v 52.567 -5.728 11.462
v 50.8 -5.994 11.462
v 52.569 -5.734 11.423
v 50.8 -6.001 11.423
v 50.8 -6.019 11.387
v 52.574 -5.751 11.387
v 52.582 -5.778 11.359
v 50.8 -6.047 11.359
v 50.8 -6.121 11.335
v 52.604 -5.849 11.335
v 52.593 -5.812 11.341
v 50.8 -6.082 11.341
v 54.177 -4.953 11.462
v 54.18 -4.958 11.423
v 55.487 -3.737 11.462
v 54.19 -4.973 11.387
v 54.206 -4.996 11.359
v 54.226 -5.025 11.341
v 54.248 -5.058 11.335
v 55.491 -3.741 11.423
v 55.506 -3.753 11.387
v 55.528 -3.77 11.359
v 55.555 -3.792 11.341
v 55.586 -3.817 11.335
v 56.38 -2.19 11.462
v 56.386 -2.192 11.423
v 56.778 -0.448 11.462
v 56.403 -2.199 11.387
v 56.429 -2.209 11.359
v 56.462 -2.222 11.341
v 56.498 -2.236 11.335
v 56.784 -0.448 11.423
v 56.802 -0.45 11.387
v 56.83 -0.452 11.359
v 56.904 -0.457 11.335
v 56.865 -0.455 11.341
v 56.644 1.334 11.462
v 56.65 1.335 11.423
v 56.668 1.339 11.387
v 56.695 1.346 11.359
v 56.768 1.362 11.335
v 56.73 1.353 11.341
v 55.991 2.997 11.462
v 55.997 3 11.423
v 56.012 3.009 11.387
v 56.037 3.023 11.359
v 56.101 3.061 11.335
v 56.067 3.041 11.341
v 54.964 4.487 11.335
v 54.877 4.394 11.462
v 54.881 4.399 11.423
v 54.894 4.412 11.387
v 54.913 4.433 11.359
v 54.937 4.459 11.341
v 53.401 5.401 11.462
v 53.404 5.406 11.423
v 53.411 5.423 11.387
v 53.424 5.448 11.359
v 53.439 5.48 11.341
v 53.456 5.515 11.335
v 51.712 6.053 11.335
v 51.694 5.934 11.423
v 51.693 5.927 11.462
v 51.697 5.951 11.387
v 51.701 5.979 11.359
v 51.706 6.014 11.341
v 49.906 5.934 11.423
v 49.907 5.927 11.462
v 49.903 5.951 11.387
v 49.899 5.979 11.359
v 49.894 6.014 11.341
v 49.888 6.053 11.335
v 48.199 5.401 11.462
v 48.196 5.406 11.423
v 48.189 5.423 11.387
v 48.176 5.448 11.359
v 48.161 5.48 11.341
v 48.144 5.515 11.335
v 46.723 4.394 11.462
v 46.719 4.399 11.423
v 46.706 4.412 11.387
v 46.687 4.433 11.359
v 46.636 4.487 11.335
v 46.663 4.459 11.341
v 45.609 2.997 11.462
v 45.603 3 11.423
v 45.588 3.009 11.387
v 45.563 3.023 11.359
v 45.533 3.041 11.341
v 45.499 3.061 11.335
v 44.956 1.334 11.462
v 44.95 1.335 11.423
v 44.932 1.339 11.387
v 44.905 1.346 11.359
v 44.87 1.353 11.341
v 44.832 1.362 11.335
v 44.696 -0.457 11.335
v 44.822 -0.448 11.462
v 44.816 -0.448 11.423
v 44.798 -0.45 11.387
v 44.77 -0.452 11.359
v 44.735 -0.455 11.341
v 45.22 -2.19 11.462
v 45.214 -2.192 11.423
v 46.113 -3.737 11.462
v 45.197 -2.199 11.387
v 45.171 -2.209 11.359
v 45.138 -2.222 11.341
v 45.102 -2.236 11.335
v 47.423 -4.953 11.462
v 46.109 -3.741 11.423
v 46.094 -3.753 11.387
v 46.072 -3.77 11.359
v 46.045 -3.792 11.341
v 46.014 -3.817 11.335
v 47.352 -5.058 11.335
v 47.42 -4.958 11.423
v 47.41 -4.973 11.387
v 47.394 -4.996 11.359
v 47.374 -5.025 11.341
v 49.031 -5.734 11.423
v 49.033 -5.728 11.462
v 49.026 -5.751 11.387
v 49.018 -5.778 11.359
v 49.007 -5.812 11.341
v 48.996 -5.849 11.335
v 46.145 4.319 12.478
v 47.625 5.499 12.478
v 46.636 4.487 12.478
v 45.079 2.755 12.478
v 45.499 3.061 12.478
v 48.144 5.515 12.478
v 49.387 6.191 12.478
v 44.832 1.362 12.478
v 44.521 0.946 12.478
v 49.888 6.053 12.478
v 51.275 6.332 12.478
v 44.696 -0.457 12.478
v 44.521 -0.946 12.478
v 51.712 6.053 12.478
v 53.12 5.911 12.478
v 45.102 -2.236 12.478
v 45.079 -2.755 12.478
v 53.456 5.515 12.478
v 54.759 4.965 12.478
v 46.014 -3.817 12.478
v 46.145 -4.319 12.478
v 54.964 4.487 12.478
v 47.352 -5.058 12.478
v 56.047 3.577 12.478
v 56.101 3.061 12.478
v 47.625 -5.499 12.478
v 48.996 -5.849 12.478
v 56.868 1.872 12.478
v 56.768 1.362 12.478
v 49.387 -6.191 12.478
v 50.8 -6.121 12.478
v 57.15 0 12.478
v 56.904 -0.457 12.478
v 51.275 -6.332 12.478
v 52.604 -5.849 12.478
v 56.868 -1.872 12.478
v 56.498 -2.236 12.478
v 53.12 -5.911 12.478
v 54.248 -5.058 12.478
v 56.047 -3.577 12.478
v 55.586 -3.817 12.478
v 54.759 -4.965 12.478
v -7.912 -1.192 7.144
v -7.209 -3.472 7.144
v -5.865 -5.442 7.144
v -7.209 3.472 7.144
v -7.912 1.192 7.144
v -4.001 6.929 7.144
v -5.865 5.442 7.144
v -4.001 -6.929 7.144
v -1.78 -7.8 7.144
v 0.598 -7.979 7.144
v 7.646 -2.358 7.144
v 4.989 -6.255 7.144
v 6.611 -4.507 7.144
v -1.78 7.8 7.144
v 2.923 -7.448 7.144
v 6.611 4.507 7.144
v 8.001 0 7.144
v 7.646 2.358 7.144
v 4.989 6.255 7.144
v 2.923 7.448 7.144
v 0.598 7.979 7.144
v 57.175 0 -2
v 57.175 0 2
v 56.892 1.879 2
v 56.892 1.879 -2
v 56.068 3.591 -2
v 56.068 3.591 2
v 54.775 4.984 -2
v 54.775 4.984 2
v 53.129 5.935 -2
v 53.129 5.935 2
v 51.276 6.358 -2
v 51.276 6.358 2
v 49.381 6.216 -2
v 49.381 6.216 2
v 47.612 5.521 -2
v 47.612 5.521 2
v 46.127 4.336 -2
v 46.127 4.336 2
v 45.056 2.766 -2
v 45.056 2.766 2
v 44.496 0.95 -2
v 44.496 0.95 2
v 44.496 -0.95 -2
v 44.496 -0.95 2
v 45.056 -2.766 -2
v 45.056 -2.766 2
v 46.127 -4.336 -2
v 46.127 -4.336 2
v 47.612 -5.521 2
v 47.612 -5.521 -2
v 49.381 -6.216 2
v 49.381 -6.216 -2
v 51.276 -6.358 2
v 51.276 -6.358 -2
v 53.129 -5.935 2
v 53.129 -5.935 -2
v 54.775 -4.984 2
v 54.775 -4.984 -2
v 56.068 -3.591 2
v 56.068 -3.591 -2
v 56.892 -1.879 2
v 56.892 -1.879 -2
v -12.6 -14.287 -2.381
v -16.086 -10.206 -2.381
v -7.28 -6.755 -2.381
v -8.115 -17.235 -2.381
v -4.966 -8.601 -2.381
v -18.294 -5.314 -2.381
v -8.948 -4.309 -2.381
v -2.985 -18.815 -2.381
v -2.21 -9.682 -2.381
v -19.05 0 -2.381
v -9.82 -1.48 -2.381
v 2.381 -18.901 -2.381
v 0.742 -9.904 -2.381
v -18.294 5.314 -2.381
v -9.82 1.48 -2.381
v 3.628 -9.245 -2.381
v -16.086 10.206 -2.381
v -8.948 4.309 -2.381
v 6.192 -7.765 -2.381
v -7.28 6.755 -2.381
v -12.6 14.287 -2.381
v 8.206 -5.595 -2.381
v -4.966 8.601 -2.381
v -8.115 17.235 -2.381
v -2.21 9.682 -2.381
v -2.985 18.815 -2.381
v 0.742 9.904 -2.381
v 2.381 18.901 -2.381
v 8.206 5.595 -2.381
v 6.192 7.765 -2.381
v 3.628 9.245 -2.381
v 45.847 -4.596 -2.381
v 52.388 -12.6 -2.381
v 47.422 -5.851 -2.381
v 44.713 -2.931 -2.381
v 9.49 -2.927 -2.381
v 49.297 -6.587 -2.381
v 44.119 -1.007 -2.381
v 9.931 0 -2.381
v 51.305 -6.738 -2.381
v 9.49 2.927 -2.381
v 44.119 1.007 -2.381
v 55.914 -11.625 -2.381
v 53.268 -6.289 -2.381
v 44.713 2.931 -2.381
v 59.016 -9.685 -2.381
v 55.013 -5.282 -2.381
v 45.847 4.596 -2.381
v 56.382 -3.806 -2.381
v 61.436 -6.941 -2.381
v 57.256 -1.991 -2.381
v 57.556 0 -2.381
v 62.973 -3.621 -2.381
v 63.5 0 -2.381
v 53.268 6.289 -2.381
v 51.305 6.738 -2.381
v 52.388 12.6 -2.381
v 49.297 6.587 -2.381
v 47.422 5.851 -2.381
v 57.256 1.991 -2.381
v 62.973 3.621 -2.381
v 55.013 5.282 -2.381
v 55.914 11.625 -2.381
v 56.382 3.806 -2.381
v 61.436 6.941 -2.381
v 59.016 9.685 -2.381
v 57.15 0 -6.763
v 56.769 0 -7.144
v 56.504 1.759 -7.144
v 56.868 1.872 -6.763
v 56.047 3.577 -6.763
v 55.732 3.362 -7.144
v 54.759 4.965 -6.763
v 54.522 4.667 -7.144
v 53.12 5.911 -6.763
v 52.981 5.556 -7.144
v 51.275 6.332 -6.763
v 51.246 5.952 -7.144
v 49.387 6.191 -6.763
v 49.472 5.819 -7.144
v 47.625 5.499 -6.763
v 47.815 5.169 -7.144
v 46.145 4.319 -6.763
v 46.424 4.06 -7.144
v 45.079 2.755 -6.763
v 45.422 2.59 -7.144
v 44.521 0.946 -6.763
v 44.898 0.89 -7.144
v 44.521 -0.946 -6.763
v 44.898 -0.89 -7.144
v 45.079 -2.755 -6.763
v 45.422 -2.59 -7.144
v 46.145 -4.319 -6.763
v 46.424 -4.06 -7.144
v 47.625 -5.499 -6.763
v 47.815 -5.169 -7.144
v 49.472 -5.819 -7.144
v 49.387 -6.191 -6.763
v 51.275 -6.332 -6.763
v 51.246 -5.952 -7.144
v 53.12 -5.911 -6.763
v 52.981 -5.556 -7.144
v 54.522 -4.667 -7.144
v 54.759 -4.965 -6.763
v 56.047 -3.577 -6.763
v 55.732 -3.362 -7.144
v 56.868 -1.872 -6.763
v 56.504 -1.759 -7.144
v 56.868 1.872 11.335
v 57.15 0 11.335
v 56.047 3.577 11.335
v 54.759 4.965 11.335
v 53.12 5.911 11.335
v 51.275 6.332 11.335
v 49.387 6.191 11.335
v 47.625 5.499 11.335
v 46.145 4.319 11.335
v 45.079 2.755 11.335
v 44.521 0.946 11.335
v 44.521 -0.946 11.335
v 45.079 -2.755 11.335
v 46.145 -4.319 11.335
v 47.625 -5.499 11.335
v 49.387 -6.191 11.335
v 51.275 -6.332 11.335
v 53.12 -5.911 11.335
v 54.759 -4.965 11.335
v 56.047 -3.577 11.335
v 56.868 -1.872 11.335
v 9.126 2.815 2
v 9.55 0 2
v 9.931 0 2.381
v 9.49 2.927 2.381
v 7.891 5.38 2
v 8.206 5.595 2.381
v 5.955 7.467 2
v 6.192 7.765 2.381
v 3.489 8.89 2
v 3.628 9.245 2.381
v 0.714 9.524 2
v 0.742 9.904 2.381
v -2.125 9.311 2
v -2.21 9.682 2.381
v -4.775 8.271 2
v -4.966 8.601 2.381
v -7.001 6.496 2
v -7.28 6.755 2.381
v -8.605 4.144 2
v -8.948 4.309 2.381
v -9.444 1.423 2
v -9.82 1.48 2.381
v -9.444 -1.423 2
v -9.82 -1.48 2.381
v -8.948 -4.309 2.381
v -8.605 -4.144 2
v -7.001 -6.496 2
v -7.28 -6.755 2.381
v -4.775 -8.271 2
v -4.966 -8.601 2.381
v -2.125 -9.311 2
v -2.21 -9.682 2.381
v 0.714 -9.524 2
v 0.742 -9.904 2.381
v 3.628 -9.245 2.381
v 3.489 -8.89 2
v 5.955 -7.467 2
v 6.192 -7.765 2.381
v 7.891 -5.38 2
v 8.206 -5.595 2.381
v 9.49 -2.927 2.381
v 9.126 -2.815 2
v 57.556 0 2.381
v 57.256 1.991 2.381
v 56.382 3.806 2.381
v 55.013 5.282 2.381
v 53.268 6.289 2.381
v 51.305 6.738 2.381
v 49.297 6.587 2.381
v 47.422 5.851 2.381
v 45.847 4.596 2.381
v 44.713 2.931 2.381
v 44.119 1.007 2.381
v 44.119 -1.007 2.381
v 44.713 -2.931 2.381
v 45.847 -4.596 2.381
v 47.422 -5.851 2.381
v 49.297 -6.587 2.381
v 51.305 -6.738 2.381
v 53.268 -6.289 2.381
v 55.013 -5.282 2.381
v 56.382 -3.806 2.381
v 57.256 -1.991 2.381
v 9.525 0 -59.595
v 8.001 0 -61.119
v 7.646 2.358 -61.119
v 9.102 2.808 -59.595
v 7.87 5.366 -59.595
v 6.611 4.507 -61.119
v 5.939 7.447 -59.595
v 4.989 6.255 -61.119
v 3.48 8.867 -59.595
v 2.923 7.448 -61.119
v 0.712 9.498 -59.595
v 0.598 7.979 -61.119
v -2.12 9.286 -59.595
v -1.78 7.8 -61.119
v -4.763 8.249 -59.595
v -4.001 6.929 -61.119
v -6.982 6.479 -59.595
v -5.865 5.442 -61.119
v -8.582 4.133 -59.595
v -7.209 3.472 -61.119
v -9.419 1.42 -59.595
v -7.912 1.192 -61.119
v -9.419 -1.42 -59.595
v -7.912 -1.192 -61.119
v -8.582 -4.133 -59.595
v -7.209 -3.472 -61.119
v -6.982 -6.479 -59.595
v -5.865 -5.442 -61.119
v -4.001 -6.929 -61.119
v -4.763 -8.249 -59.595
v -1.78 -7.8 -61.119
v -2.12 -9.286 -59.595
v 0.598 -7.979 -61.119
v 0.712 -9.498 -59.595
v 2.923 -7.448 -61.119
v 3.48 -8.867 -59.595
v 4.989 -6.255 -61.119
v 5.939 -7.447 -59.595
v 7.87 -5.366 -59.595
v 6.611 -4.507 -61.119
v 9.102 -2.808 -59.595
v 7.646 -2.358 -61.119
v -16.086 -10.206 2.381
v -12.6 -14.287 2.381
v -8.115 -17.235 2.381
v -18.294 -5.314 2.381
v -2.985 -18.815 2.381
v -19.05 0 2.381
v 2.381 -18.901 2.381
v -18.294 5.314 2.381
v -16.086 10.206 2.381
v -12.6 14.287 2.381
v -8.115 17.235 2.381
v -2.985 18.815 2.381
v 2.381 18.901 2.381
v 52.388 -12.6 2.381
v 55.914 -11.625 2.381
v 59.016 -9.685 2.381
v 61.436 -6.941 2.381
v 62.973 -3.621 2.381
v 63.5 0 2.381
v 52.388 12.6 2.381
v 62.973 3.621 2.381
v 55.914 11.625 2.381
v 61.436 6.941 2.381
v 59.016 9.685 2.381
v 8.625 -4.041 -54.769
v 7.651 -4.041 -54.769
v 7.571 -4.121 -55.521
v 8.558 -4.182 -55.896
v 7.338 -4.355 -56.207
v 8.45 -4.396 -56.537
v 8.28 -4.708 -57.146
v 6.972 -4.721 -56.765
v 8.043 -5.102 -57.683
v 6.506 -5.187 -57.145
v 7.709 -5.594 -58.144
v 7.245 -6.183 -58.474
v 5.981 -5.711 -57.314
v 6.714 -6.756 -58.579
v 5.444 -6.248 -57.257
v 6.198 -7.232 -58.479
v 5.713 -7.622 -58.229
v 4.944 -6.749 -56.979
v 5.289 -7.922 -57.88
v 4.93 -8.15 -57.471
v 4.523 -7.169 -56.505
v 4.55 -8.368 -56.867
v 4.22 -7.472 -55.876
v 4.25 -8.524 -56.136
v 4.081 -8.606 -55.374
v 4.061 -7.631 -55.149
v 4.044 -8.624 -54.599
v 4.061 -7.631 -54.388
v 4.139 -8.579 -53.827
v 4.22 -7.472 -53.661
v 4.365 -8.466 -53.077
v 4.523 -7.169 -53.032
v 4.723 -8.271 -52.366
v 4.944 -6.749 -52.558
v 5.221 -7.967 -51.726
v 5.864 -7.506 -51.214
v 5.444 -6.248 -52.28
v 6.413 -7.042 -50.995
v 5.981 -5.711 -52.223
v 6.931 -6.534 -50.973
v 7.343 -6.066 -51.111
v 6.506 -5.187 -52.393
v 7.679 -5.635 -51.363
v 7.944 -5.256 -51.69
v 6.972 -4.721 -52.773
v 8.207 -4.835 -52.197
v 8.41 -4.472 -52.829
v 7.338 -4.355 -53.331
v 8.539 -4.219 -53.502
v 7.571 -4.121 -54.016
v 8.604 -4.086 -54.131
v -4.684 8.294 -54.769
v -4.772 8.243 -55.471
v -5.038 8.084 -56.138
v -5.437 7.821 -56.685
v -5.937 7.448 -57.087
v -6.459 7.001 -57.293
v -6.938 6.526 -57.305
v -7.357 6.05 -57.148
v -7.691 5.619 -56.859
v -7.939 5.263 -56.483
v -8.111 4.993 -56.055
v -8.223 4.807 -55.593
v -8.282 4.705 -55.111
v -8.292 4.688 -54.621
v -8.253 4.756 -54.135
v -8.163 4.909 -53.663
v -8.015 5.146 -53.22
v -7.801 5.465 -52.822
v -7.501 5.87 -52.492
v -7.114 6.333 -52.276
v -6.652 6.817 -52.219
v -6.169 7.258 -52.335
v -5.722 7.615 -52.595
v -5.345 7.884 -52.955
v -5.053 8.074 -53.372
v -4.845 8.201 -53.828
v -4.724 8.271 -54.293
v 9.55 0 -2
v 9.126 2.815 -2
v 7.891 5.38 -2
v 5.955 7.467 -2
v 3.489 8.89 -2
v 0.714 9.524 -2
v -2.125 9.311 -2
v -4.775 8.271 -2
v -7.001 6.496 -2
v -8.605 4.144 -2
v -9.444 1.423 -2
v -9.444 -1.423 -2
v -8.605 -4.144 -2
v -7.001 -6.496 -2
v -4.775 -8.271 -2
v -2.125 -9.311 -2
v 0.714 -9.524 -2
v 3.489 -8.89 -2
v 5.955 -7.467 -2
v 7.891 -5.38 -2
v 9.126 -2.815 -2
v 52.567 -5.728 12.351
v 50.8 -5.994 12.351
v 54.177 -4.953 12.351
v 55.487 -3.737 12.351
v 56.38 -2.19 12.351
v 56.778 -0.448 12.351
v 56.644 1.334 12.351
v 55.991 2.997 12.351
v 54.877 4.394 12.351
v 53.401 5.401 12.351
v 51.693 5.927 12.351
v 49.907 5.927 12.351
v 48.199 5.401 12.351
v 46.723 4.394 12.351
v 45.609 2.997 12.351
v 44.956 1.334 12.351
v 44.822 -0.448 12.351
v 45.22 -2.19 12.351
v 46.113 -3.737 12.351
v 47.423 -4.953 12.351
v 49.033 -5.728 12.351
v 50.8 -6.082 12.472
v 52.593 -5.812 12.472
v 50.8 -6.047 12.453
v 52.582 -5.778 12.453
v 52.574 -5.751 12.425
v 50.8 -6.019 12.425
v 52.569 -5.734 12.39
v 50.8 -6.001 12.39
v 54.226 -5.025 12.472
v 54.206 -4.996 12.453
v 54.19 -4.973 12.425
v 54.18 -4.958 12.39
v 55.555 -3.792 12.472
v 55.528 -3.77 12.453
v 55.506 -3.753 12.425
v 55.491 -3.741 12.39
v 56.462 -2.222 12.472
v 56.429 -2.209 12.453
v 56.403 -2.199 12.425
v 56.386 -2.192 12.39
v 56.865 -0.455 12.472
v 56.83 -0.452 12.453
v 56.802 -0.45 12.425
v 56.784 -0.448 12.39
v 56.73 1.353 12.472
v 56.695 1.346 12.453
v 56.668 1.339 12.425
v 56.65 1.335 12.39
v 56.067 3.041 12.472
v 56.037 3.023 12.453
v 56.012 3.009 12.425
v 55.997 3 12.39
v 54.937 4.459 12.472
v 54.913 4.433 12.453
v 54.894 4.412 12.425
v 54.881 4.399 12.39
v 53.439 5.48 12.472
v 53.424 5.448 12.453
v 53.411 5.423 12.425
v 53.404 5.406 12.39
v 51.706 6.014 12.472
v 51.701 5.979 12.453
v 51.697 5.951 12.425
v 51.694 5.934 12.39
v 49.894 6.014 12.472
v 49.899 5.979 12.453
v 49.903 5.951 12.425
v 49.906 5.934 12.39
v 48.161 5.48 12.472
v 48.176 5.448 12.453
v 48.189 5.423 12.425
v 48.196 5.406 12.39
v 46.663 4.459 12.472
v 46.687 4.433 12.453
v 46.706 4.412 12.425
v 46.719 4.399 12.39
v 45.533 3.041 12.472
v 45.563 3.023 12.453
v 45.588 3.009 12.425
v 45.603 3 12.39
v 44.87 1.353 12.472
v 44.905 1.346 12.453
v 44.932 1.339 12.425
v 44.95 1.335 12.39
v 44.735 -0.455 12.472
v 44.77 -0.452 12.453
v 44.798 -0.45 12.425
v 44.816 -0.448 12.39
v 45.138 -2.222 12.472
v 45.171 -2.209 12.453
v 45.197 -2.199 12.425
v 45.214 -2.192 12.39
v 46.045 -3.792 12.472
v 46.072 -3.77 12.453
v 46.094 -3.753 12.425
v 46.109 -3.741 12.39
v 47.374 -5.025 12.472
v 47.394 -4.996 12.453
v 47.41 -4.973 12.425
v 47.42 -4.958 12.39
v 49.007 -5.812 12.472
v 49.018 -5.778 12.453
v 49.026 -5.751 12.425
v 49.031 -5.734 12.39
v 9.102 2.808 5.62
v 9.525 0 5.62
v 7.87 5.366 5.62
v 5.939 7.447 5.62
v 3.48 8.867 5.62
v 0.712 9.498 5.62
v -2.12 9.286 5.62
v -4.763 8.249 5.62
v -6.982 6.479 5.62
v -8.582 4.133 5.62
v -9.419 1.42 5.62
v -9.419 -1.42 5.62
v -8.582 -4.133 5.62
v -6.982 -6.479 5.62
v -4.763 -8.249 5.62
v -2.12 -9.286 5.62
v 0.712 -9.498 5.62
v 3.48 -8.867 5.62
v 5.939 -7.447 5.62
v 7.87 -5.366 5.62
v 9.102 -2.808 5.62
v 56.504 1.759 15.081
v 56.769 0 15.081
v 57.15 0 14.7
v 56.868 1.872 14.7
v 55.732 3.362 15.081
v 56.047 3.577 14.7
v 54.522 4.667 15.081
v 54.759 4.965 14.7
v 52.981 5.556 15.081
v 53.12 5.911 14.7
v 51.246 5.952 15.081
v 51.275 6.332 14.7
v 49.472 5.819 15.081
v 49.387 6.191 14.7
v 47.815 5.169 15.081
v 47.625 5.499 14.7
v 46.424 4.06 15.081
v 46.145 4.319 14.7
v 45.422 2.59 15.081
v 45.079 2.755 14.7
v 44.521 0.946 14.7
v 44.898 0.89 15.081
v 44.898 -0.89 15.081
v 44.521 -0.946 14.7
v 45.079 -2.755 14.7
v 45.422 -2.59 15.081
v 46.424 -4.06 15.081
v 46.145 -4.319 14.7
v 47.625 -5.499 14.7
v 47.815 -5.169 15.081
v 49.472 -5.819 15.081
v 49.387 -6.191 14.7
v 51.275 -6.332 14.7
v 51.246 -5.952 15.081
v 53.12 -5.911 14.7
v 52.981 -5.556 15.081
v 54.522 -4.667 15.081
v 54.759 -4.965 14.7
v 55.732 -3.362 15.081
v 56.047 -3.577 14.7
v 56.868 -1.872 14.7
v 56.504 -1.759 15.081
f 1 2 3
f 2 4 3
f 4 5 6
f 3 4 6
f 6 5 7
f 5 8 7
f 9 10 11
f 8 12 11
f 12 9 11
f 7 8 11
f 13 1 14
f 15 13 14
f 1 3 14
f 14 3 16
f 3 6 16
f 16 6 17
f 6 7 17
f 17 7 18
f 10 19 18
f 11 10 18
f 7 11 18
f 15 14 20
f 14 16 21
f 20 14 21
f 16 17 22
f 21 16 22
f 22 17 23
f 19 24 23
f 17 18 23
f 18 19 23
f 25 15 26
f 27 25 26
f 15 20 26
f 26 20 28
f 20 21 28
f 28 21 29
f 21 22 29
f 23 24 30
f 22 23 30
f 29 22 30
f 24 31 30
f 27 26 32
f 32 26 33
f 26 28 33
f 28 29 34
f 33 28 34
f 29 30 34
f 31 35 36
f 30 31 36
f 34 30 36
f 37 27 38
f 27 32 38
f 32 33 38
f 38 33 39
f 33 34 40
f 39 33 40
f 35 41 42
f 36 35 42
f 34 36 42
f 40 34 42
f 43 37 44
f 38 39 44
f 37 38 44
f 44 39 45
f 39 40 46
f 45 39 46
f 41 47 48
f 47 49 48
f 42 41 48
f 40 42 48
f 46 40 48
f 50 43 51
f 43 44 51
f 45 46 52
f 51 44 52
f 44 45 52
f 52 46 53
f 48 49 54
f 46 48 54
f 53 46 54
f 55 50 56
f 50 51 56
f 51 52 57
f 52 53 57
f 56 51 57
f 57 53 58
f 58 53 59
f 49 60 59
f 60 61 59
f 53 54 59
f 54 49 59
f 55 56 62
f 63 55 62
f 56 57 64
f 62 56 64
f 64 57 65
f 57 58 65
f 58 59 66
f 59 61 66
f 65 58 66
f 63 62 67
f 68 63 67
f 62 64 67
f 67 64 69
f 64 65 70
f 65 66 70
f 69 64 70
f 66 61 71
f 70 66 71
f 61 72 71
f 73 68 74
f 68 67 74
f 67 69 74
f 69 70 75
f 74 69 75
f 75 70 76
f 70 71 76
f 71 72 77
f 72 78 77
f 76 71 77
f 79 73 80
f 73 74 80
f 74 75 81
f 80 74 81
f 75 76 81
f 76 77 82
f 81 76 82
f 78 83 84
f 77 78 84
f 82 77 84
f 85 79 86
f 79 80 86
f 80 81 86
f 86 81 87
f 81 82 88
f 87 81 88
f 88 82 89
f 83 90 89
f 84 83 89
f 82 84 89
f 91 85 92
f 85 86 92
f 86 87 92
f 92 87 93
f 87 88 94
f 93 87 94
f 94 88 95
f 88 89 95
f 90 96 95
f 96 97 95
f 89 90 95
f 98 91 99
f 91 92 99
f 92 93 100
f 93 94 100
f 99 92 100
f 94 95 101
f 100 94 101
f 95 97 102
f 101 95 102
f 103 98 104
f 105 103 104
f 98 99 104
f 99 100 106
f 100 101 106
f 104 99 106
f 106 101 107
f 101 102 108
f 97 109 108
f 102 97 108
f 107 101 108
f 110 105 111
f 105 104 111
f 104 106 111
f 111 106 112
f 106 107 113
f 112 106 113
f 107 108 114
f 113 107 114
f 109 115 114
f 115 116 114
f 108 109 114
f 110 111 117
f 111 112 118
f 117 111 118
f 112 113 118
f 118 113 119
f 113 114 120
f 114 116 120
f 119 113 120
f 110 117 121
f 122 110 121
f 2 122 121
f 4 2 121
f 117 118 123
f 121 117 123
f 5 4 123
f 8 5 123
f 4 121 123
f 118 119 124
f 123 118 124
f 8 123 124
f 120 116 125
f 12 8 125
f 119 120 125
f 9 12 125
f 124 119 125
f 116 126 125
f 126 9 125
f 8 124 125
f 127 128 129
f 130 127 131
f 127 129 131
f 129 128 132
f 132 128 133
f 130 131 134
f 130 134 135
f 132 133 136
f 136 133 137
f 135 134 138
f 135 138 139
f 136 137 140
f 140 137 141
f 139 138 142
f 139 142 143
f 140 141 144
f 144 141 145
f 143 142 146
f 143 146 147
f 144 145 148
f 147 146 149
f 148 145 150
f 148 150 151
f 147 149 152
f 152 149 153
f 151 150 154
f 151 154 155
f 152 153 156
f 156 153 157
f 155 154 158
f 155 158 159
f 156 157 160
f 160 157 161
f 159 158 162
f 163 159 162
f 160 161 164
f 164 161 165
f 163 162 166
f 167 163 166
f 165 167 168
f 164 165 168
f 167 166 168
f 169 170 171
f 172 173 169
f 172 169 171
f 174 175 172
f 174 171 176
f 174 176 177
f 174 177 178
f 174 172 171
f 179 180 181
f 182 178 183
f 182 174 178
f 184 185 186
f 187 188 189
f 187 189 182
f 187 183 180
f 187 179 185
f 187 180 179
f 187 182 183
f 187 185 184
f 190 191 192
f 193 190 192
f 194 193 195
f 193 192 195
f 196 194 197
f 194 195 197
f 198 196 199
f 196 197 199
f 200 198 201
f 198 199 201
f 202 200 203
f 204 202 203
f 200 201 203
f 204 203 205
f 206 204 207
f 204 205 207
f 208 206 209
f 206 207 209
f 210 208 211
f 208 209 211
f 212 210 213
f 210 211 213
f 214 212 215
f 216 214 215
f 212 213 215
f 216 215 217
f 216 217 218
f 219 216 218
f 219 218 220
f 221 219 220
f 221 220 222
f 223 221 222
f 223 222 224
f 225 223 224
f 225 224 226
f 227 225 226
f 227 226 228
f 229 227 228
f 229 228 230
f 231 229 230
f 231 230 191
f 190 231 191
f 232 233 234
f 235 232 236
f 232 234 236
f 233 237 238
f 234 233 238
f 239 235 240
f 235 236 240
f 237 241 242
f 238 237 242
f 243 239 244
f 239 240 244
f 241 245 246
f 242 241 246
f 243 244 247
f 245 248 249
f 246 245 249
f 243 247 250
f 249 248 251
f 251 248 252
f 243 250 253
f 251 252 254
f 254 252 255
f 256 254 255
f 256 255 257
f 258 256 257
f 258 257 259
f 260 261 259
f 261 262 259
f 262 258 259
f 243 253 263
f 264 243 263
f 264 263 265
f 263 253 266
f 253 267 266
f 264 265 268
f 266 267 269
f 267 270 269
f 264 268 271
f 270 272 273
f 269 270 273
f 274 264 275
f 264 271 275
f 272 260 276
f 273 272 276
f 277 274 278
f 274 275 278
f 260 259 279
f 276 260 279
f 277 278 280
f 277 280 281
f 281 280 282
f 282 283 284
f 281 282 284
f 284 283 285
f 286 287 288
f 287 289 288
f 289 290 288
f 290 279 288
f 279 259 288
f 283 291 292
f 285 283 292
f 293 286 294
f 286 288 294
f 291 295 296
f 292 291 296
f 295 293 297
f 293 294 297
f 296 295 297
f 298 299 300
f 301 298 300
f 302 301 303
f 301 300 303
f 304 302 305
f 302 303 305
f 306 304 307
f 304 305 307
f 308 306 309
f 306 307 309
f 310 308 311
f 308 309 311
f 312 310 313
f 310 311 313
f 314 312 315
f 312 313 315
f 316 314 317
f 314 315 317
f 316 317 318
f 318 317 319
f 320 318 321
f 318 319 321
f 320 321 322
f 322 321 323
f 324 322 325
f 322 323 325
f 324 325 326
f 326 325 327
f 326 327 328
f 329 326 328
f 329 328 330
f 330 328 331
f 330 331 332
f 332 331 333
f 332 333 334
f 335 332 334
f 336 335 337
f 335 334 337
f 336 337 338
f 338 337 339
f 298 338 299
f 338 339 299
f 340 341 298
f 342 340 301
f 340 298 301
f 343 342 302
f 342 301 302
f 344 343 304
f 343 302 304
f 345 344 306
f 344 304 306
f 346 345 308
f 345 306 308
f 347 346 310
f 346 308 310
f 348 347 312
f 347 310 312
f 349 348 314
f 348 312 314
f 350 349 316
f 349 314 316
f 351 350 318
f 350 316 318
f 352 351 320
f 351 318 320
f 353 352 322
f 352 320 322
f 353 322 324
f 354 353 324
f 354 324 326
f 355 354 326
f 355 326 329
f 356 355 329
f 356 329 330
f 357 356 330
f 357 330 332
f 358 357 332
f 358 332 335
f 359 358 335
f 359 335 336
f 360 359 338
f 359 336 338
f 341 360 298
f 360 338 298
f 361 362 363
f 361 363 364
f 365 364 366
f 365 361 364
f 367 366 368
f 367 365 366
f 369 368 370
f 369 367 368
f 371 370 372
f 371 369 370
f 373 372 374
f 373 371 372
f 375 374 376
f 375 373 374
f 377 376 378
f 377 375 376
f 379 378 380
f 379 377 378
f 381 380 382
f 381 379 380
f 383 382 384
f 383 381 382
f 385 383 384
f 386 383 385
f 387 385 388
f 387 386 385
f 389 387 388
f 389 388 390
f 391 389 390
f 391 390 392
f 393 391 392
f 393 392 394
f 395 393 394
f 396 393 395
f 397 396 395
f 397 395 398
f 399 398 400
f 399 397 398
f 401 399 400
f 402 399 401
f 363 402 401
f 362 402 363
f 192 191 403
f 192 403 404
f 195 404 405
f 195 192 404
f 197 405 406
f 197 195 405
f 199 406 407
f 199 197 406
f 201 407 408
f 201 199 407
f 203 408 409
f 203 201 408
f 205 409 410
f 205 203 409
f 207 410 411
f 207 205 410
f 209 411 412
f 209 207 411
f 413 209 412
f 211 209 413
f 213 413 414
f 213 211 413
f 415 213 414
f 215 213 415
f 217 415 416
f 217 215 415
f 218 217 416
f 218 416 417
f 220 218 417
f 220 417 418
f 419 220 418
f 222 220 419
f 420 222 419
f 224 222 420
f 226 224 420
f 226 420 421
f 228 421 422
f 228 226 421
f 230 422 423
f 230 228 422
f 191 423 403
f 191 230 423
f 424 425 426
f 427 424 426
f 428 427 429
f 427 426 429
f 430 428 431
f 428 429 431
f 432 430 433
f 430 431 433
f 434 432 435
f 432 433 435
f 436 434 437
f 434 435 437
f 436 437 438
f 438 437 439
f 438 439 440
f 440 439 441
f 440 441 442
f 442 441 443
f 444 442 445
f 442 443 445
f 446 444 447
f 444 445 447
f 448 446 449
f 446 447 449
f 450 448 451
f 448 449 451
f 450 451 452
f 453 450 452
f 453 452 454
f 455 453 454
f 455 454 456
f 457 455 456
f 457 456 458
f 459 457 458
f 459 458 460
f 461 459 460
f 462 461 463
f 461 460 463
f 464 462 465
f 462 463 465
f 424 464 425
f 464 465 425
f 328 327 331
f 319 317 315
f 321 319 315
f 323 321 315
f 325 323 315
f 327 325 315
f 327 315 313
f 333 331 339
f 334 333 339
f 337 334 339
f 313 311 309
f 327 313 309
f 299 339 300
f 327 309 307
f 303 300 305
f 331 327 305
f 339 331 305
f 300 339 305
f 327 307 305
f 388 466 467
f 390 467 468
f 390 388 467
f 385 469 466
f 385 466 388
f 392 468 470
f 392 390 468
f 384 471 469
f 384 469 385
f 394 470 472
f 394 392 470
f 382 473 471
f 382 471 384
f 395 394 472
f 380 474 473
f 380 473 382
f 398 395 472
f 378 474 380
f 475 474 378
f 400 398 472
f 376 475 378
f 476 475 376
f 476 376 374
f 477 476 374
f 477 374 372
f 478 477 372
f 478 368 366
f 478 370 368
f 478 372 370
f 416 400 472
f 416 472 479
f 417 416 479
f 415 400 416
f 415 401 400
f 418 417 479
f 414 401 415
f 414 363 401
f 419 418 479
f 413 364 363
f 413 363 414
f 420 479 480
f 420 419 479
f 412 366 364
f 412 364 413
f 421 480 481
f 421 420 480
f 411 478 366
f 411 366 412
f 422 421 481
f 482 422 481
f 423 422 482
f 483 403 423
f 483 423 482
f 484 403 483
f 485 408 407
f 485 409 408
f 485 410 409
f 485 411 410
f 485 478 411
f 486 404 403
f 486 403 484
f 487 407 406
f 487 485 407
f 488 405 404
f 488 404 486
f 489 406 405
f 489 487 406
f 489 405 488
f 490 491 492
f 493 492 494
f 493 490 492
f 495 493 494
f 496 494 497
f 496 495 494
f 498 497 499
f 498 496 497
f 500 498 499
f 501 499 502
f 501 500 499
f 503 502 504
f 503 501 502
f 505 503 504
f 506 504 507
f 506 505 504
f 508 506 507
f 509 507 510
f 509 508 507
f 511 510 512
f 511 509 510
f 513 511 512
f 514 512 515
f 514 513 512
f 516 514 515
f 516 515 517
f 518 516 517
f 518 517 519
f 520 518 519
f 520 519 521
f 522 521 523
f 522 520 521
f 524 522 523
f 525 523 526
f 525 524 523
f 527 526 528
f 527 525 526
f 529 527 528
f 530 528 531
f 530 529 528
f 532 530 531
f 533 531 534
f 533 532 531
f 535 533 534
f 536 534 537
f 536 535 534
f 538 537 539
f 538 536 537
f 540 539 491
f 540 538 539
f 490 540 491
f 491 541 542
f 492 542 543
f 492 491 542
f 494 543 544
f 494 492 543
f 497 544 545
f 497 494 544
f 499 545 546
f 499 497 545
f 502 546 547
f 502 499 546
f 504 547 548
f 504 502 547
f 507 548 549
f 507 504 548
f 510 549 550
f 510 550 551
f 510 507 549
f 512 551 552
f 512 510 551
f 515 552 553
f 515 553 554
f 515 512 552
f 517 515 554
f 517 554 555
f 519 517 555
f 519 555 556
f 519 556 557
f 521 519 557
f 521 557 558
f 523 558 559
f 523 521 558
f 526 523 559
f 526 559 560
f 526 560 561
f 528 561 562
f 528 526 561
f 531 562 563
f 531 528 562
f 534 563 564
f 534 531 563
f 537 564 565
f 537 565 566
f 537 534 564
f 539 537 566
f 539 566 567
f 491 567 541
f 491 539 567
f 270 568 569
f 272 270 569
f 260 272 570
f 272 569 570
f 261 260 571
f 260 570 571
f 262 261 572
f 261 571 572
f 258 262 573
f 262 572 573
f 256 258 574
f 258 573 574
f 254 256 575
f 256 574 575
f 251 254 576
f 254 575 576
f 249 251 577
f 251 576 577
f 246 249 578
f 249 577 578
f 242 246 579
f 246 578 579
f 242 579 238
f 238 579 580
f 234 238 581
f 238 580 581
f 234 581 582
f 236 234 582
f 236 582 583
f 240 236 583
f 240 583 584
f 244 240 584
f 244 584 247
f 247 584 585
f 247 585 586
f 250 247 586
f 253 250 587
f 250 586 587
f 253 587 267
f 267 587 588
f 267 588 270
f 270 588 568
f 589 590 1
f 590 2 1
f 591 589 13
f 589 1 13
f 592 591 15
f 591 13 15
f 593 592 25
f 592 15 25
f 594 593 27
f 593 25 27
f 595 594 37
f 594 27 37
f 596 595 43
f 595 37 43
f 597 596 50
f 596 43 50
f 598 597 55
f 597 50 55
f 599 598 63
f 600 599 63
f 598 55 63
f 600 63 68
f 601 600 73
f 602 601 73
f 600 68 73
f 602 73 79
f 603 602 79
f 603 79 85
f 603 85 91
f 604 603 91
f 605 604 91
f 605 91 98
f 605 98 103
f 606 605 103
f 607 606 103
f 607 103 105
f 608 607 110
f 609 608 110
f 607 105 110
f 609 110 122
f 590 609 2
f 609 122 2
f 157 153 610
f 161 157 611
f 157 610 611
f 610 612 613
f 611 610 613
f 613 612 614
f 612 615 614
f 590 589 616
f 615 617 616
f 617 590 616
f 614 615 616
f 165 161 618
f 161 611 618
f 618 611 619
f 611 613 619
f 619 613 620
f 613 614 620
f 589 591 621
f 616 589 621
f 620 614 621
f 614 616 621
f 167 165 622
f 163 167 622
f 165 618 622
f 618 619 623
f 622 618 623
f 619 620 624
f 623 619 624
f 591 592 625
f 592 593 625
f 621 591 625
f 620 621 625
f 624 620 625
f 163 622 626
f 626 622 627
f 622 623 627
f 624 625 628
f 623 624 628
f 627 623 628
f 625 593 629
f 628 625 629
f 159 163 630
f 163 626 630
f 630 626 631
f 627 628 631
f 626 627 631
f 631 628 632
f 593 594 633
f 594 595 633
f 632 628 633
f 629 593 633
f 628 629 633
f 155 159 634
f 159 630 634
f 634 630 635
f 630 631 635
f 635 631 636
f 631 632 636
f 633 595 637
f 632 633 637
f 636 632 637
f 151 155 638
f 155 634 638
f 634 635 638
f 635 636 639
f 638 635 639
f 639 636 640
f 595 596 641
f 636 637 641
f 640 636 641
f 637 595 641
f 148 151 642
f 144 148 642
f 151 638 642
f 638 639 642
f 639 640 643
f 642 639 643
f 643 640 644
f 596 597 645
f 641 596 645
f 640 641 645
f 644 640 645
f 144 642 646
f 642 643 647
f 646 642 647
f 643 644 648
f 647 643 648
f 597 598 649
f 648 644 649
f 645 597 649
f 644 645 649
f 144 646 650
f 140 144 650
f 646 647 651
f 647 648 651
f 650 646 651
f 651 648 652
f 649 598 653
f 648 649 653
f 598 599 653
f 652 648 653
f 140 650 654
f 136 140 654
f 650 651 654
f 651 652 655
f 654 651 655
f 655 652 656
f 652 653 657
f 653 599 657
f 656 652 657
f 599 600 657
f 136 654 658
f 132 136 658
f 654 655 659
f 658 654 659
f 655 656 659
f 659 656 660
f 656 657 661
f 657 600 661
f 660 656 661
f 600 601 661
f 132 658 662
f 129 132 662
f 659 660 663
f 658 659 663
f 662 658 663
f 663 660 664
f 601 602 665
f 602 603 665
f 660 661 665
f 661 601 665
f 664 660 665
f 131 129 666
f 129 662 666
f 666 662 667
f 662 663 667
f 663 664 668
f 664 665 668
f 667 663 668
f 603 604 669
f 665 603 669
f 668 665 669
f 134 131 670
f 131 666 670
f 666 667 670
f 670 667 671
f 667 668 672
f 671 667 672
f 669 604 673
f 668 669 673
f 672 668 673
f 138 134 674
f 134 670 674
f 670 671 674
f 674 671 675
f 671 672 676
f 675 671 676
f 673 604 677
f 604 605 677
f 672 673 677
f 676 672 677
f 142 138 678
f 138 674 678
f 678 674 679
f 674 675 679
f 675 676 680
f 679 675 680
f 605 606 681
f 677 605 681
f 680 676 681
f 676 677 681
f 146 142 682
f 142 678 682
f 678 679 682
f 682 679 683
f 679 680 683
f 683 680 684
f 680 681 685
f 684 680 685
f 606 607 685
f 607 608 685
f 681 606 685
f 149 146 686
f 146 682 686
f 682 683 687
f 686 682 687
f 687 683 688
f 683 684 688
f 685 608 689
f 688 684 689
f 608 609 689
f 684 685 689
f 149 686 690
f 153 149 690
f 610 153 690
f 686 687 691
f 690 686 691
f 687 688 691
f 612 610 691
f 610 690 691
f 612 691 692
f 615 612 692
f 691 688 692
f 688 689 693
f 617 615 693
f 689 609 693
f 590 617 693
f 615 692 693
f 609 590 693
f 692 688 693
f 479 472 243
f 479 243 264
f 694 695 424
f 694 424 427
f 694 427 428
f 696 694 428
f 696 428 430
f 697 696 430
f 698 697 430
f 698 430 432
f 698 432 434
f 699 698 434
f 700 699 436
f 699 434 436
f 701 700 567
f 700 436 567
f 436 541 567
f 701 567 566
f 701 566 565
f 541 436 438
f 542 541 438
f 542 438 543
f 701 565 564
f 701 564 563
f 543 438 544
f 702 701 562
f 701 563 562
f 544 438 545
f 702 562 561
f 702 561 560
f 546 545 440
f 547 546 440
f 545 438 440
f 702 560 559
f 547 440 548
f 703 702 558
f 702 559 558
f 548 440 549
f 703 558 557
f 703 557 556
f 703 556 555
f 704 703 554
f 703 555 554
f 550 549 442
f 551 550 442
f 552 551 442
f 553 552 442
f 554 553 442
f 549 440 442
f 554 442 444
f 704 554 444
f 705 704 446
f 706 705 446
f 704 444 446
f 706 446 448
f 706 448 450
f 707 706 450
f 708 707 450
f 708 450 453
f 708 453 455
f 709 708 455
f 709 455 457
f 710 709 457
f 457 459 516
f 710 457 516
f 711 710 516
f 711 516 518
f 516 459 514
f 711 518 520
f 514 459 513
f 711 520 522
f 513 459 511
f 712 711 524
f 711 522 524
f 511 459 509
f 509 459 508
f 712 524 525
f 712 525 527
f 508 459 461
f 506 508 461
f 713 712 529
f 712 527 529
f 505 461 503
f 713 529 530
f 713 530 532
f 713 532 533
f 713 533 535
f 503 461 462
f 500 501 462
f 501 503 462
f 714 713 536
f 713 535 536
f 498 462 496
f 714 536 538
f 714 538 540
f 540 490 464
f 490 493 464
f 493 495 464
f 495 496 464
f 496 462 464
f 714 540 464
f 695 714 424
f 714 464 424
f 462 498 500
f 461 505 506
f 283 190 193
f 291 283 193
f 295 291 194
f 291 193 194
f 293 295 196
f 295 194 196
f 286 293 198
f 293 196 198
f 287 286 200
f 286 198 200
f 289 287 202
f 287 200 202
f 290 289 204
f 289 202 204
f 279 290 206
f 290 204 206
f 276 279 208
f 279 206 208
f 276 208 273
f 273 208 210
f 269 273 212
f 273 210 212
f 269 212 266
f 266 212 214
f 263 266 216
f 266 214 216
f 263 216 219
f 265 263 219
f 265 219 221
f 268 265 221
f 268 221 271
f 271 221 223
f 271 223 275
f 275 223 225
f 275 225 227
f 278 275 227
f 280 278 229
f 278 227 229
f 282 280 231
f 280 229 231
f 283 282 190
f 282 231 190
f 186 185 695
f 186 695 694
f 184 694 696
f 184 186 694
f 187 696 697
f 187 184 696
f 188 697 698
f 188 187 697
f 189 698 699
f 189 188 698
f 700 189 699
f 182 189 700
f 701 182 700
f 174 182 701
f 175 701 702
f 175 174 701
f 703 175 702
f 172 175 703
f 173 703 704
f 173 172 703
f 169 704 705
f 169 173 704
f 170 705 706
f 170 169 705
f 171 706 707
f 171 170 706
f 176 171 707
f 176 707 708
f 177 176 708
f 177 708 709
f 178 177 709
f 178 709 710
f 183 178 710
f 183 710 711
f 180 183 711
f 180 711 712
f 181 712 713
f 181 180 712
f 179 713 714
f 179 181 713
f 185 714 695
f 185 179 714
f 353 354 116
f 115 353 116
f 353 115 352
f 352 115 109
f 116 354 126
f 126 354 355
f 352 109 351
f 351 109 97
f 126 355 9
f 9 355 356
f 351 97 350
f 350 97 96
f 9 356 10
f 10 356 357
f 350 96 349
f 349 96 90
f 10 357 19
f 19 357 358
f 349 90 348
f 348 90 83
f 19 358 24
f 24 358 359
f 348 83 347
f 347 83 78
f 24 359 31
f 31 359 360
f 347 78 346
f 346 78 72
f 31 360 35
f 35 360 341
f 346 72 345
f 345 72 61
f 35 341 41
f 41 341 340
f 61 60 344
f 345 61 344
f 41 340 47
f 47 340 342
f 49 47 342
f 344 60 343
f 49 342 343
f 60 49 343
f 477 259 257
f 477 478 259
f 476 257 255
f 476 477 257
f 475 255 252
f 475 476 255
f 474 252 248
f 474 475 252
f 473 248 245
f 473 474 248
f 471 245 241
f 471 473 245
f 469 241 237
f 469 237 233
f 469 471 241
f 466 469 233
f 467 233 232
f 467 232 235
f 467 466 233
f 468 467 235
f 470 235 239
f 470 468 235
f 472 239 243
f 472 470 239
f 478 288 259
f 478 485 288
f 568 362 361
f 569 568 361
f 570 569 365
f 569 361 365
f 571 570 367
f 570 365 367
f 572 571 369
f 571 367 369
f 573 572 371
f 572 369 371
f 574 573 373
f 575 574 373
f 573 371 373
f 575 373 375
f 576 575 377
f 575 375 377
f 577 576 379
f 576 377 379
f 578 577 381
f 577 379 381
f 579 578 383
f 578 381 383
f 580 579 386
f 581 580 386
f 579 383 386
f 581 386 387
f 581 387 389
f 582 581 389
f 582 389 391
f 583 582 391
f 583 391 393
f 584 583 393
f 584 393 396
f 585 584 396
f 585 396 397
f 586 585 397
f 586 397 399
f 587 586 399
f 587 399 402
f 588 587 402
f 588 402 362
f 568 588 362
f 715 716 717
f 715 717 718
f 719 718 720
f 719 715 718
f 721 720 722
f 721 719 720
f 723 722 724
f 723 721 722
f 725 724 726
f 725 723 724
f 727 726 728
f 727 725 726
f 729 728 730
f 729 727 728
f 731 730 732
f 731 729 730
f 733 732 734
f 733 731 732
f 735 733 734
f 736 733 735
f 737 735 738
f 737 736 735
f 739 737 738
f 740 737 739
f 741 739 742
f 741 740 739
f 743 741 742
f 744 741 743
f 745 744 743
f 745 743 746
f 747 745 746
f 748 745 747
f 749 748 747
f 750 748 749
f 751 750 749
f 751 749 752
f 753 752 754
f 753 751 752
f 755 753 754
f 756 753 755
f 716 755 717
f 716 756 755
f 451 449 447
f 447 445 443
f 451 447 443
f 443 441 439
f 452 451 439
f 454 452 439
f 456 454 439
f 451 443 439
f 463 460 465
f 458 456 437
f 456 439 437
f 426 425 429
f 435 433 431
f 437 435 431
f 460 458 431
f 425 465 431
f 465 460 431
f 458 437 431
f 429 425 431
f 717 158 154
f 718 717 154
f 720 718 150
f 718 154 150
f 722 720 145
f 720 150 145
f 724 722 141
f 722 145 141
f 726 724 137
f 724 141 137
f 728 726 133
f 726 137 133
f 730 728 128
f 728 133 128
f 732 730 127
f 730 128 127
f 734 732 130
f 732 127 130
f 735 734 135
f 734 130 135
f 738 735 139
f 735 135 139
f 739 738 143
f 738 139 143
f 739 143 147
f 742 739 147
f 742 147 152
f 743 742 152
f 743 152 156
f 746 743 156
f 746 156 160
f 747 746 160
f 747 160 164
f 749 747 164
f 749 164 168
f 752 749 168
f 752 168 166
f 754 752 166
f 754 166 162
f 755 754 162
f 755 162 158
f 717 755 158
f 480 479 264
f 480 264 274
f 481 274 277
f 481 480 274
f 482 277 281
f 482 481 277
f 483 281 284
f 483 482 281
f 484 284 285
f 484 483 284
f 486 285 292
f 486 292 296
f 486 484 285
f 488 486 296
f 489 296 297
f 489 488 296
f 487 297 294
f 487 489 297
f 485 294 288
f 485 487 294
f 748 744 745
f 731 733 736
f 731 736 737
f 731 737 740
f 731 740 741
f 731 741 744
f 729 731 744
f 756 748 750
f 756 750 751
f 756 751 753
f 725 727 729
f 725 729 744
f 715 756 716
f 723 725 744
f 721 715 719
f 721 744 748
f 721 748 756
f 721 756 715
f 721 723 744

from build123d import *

# Parameters (mm, degrees)
BOSS_EXTRUDE1_DEPTH      = 2.38125
BOSS_EXTRUDE2_DEPTH      = 4.7625
BOSS_EXTRUDE2_DEPTH_BACK = 63.5
SKETCH2_R                = 9.525
BOSS_EXTRUDE3_DEPTH      = 12.7
BOSS_EXTRUDE3_DEPTH_BACK = 9.525
SKETCH3_R                = 6.35
SKETCH4_R                = 6.3754
SKETCH4_R_2              = 9.5504
CUT_EXTRUDE1_DEPTH       = 92.800885072
CHAMFER1_SIZE            = 1.524
CHAMFER2_SIZE            = 0.381
CHAMFER3_SIZE            = 0.381


with BuildPart() as part:
    # Sketch1 → Boss-Extrude1 (new, symmetric)
    with BuildSketch(Plane.XY):
        with BuildLine():
            ThreePointArc((2.38125, 18.900585928), (-19.05, 0), (2.38125, -18.900585928))
            Line((2.38125, -18.900585928), (52.3875, -12.600390619))
            ThreePointArc((52.3875, -12.600390619), (63.5, 0), (52.3875, 12.600390619))
            Line((52.3875, 12.600390619), (2.38125, 18.900585928))
        make_face()
    extrude(amount=BOSS_EXTRUDE1_DEPTH, both=True)

    # Sketch4 → Cut-Extrude1 (cut, through all)
    with BuildSketch(Plane.XY.offset(2.38125)):
        with Locations((50.8, 0)):
            Circle(SKETCH4_R)
        Circle(SKETCH4_R_2)
    extrude(amount=-CUT_EXTRUDE1_DEPTH, mode=Mode.SUBTRACT)

    # Chamfer3
    chamfer3_edges = [part.edges().sort_by_distance(p)[0] for p in [
        (44.4246, 0, -2.38125),
        (44.4246, 0, 2.38125),
        (-9.5504, 0, -2.38125),
        (-9.5504, 0, 2.38125),
    ]]
    chamfer(chamfer3_edges, length=CHAMFER3_SIZE)


with BuildPart() as body_2:
    # Sketch2 → Boss-Extrude2 (new, two sides: drawn at the far end of the back side and taken through both)
    with BuildSketch(Plane.XY.offset(2.38125).offset(-BOSS_EXTRUDE2_DEPTH_BACK)):
        Circle(SKETCH2_R)
    extrude(amount=BOSS_EXTRUDE2_DEPTH + BOSS_EXTRUDE2_DEPTH_BACK)

    # Chamfer1
    chamfer1_edges = [body_2.edges().sort_by_distance(p)[0] for p in [
        (-9.525, 0, -61.11875),
        (-9.525, 0, 7.14375),
    ]]
    chamfer(chamfer1_edges, length=CHAMFER1_SIZE)

    # Sketch7 → 1/4-20 Tapped Hole1 (revolve, cut)
    with BuildSketch(Plane(origin=(6.735192091, -6.735192091, -54.76875), x_dir=(0.7071067811865488, 0.7071067811865464, 0), z_dir=(0, 0, 1))):
        Polygon((0, 0), (0, 36.465768363), (3.81, 36.465768363), (2.5527, 35.208468363), (2.5527, 1.2573), (3.81, 0), align=None)
    revolve(axis=Axis((11.225320151, -11.225320151, -54.76875), (-0.7071067811865464, 0.7071067811865487, 0)), mode=Mode.SUBTRACT)


with BuildPart() as body_3:
    # Sketch3 → Boss-Extrude3 (new, two sides: drawn at the far end of the back side and taken through both)
    with BuildSketch(Plane.XY.offset(2.38125).offset(-BOSS_EXTRUDE3_DEPTH_BACK)):
        with Locations((50.8, 0)):
            Circle(SKETCH3_R)
    extrude(amount=BOSS_EXTRUDE3_DEPTH + BOSS_EXTRUDE3_DEPTH_BACK)

    # Chamfer2
    chamfer2_edges = [body_3.edges().sort_by_distance(p)[0] for p in [
        (44.45, 0, -7.14375),
        (44.45, 0, 15.08125),
    ]]
    chamfer(chamfer2_edges, length=CHAMFER2_SIZE)

    # Groove Sketch → Retaining Ring Groove (revolve, cut)
    with BuildSketch(Plane(origin=(12.915629716, 1.118285362, -17.503040002), x_dir=(0.034992182664449985, -0.0010329126589647126, 0.9993870522694481), z_dir=(-0.029505531457742346, -0.9995646170275317, 0)), mode=Mode.PRIVATE) as retaining_ring_groove_sk:
        with BuildLine():
            Line((30.361220287, -42.985751577), (30.369222984, -43.214211457))
            Line((30.369222984, -43.214211457), (31.511522385, -43.174197971))
            Line((31.511522385, -43.174197971), (31.503519688, -42.945738091))
            ThreePointArc((31.503519688, -42.945738091), (31.463201293, -42.85729276), (31.372151589, -42.823261878))
            Line((31.372151589, -42.823261878), (30.4836965, -42.854383478))
            ThreePointArc((30.4836965, -42.854383478), (30.39525117, -42.894701873), (30.361220287, -42.985751577))
        make_face()
    revolve(retaining_ring_groove_sk.sketch.rotate(Axis((50.8, 0, -19.256242745), (0, 0, 1)), 271.690787812), axis=Axis((50.8, 0, -19.256242745), (0, 0, 1)), mode=Mode.SUBTRACT)


solid = Compound([part.part, body_2.part, body_3.part])
